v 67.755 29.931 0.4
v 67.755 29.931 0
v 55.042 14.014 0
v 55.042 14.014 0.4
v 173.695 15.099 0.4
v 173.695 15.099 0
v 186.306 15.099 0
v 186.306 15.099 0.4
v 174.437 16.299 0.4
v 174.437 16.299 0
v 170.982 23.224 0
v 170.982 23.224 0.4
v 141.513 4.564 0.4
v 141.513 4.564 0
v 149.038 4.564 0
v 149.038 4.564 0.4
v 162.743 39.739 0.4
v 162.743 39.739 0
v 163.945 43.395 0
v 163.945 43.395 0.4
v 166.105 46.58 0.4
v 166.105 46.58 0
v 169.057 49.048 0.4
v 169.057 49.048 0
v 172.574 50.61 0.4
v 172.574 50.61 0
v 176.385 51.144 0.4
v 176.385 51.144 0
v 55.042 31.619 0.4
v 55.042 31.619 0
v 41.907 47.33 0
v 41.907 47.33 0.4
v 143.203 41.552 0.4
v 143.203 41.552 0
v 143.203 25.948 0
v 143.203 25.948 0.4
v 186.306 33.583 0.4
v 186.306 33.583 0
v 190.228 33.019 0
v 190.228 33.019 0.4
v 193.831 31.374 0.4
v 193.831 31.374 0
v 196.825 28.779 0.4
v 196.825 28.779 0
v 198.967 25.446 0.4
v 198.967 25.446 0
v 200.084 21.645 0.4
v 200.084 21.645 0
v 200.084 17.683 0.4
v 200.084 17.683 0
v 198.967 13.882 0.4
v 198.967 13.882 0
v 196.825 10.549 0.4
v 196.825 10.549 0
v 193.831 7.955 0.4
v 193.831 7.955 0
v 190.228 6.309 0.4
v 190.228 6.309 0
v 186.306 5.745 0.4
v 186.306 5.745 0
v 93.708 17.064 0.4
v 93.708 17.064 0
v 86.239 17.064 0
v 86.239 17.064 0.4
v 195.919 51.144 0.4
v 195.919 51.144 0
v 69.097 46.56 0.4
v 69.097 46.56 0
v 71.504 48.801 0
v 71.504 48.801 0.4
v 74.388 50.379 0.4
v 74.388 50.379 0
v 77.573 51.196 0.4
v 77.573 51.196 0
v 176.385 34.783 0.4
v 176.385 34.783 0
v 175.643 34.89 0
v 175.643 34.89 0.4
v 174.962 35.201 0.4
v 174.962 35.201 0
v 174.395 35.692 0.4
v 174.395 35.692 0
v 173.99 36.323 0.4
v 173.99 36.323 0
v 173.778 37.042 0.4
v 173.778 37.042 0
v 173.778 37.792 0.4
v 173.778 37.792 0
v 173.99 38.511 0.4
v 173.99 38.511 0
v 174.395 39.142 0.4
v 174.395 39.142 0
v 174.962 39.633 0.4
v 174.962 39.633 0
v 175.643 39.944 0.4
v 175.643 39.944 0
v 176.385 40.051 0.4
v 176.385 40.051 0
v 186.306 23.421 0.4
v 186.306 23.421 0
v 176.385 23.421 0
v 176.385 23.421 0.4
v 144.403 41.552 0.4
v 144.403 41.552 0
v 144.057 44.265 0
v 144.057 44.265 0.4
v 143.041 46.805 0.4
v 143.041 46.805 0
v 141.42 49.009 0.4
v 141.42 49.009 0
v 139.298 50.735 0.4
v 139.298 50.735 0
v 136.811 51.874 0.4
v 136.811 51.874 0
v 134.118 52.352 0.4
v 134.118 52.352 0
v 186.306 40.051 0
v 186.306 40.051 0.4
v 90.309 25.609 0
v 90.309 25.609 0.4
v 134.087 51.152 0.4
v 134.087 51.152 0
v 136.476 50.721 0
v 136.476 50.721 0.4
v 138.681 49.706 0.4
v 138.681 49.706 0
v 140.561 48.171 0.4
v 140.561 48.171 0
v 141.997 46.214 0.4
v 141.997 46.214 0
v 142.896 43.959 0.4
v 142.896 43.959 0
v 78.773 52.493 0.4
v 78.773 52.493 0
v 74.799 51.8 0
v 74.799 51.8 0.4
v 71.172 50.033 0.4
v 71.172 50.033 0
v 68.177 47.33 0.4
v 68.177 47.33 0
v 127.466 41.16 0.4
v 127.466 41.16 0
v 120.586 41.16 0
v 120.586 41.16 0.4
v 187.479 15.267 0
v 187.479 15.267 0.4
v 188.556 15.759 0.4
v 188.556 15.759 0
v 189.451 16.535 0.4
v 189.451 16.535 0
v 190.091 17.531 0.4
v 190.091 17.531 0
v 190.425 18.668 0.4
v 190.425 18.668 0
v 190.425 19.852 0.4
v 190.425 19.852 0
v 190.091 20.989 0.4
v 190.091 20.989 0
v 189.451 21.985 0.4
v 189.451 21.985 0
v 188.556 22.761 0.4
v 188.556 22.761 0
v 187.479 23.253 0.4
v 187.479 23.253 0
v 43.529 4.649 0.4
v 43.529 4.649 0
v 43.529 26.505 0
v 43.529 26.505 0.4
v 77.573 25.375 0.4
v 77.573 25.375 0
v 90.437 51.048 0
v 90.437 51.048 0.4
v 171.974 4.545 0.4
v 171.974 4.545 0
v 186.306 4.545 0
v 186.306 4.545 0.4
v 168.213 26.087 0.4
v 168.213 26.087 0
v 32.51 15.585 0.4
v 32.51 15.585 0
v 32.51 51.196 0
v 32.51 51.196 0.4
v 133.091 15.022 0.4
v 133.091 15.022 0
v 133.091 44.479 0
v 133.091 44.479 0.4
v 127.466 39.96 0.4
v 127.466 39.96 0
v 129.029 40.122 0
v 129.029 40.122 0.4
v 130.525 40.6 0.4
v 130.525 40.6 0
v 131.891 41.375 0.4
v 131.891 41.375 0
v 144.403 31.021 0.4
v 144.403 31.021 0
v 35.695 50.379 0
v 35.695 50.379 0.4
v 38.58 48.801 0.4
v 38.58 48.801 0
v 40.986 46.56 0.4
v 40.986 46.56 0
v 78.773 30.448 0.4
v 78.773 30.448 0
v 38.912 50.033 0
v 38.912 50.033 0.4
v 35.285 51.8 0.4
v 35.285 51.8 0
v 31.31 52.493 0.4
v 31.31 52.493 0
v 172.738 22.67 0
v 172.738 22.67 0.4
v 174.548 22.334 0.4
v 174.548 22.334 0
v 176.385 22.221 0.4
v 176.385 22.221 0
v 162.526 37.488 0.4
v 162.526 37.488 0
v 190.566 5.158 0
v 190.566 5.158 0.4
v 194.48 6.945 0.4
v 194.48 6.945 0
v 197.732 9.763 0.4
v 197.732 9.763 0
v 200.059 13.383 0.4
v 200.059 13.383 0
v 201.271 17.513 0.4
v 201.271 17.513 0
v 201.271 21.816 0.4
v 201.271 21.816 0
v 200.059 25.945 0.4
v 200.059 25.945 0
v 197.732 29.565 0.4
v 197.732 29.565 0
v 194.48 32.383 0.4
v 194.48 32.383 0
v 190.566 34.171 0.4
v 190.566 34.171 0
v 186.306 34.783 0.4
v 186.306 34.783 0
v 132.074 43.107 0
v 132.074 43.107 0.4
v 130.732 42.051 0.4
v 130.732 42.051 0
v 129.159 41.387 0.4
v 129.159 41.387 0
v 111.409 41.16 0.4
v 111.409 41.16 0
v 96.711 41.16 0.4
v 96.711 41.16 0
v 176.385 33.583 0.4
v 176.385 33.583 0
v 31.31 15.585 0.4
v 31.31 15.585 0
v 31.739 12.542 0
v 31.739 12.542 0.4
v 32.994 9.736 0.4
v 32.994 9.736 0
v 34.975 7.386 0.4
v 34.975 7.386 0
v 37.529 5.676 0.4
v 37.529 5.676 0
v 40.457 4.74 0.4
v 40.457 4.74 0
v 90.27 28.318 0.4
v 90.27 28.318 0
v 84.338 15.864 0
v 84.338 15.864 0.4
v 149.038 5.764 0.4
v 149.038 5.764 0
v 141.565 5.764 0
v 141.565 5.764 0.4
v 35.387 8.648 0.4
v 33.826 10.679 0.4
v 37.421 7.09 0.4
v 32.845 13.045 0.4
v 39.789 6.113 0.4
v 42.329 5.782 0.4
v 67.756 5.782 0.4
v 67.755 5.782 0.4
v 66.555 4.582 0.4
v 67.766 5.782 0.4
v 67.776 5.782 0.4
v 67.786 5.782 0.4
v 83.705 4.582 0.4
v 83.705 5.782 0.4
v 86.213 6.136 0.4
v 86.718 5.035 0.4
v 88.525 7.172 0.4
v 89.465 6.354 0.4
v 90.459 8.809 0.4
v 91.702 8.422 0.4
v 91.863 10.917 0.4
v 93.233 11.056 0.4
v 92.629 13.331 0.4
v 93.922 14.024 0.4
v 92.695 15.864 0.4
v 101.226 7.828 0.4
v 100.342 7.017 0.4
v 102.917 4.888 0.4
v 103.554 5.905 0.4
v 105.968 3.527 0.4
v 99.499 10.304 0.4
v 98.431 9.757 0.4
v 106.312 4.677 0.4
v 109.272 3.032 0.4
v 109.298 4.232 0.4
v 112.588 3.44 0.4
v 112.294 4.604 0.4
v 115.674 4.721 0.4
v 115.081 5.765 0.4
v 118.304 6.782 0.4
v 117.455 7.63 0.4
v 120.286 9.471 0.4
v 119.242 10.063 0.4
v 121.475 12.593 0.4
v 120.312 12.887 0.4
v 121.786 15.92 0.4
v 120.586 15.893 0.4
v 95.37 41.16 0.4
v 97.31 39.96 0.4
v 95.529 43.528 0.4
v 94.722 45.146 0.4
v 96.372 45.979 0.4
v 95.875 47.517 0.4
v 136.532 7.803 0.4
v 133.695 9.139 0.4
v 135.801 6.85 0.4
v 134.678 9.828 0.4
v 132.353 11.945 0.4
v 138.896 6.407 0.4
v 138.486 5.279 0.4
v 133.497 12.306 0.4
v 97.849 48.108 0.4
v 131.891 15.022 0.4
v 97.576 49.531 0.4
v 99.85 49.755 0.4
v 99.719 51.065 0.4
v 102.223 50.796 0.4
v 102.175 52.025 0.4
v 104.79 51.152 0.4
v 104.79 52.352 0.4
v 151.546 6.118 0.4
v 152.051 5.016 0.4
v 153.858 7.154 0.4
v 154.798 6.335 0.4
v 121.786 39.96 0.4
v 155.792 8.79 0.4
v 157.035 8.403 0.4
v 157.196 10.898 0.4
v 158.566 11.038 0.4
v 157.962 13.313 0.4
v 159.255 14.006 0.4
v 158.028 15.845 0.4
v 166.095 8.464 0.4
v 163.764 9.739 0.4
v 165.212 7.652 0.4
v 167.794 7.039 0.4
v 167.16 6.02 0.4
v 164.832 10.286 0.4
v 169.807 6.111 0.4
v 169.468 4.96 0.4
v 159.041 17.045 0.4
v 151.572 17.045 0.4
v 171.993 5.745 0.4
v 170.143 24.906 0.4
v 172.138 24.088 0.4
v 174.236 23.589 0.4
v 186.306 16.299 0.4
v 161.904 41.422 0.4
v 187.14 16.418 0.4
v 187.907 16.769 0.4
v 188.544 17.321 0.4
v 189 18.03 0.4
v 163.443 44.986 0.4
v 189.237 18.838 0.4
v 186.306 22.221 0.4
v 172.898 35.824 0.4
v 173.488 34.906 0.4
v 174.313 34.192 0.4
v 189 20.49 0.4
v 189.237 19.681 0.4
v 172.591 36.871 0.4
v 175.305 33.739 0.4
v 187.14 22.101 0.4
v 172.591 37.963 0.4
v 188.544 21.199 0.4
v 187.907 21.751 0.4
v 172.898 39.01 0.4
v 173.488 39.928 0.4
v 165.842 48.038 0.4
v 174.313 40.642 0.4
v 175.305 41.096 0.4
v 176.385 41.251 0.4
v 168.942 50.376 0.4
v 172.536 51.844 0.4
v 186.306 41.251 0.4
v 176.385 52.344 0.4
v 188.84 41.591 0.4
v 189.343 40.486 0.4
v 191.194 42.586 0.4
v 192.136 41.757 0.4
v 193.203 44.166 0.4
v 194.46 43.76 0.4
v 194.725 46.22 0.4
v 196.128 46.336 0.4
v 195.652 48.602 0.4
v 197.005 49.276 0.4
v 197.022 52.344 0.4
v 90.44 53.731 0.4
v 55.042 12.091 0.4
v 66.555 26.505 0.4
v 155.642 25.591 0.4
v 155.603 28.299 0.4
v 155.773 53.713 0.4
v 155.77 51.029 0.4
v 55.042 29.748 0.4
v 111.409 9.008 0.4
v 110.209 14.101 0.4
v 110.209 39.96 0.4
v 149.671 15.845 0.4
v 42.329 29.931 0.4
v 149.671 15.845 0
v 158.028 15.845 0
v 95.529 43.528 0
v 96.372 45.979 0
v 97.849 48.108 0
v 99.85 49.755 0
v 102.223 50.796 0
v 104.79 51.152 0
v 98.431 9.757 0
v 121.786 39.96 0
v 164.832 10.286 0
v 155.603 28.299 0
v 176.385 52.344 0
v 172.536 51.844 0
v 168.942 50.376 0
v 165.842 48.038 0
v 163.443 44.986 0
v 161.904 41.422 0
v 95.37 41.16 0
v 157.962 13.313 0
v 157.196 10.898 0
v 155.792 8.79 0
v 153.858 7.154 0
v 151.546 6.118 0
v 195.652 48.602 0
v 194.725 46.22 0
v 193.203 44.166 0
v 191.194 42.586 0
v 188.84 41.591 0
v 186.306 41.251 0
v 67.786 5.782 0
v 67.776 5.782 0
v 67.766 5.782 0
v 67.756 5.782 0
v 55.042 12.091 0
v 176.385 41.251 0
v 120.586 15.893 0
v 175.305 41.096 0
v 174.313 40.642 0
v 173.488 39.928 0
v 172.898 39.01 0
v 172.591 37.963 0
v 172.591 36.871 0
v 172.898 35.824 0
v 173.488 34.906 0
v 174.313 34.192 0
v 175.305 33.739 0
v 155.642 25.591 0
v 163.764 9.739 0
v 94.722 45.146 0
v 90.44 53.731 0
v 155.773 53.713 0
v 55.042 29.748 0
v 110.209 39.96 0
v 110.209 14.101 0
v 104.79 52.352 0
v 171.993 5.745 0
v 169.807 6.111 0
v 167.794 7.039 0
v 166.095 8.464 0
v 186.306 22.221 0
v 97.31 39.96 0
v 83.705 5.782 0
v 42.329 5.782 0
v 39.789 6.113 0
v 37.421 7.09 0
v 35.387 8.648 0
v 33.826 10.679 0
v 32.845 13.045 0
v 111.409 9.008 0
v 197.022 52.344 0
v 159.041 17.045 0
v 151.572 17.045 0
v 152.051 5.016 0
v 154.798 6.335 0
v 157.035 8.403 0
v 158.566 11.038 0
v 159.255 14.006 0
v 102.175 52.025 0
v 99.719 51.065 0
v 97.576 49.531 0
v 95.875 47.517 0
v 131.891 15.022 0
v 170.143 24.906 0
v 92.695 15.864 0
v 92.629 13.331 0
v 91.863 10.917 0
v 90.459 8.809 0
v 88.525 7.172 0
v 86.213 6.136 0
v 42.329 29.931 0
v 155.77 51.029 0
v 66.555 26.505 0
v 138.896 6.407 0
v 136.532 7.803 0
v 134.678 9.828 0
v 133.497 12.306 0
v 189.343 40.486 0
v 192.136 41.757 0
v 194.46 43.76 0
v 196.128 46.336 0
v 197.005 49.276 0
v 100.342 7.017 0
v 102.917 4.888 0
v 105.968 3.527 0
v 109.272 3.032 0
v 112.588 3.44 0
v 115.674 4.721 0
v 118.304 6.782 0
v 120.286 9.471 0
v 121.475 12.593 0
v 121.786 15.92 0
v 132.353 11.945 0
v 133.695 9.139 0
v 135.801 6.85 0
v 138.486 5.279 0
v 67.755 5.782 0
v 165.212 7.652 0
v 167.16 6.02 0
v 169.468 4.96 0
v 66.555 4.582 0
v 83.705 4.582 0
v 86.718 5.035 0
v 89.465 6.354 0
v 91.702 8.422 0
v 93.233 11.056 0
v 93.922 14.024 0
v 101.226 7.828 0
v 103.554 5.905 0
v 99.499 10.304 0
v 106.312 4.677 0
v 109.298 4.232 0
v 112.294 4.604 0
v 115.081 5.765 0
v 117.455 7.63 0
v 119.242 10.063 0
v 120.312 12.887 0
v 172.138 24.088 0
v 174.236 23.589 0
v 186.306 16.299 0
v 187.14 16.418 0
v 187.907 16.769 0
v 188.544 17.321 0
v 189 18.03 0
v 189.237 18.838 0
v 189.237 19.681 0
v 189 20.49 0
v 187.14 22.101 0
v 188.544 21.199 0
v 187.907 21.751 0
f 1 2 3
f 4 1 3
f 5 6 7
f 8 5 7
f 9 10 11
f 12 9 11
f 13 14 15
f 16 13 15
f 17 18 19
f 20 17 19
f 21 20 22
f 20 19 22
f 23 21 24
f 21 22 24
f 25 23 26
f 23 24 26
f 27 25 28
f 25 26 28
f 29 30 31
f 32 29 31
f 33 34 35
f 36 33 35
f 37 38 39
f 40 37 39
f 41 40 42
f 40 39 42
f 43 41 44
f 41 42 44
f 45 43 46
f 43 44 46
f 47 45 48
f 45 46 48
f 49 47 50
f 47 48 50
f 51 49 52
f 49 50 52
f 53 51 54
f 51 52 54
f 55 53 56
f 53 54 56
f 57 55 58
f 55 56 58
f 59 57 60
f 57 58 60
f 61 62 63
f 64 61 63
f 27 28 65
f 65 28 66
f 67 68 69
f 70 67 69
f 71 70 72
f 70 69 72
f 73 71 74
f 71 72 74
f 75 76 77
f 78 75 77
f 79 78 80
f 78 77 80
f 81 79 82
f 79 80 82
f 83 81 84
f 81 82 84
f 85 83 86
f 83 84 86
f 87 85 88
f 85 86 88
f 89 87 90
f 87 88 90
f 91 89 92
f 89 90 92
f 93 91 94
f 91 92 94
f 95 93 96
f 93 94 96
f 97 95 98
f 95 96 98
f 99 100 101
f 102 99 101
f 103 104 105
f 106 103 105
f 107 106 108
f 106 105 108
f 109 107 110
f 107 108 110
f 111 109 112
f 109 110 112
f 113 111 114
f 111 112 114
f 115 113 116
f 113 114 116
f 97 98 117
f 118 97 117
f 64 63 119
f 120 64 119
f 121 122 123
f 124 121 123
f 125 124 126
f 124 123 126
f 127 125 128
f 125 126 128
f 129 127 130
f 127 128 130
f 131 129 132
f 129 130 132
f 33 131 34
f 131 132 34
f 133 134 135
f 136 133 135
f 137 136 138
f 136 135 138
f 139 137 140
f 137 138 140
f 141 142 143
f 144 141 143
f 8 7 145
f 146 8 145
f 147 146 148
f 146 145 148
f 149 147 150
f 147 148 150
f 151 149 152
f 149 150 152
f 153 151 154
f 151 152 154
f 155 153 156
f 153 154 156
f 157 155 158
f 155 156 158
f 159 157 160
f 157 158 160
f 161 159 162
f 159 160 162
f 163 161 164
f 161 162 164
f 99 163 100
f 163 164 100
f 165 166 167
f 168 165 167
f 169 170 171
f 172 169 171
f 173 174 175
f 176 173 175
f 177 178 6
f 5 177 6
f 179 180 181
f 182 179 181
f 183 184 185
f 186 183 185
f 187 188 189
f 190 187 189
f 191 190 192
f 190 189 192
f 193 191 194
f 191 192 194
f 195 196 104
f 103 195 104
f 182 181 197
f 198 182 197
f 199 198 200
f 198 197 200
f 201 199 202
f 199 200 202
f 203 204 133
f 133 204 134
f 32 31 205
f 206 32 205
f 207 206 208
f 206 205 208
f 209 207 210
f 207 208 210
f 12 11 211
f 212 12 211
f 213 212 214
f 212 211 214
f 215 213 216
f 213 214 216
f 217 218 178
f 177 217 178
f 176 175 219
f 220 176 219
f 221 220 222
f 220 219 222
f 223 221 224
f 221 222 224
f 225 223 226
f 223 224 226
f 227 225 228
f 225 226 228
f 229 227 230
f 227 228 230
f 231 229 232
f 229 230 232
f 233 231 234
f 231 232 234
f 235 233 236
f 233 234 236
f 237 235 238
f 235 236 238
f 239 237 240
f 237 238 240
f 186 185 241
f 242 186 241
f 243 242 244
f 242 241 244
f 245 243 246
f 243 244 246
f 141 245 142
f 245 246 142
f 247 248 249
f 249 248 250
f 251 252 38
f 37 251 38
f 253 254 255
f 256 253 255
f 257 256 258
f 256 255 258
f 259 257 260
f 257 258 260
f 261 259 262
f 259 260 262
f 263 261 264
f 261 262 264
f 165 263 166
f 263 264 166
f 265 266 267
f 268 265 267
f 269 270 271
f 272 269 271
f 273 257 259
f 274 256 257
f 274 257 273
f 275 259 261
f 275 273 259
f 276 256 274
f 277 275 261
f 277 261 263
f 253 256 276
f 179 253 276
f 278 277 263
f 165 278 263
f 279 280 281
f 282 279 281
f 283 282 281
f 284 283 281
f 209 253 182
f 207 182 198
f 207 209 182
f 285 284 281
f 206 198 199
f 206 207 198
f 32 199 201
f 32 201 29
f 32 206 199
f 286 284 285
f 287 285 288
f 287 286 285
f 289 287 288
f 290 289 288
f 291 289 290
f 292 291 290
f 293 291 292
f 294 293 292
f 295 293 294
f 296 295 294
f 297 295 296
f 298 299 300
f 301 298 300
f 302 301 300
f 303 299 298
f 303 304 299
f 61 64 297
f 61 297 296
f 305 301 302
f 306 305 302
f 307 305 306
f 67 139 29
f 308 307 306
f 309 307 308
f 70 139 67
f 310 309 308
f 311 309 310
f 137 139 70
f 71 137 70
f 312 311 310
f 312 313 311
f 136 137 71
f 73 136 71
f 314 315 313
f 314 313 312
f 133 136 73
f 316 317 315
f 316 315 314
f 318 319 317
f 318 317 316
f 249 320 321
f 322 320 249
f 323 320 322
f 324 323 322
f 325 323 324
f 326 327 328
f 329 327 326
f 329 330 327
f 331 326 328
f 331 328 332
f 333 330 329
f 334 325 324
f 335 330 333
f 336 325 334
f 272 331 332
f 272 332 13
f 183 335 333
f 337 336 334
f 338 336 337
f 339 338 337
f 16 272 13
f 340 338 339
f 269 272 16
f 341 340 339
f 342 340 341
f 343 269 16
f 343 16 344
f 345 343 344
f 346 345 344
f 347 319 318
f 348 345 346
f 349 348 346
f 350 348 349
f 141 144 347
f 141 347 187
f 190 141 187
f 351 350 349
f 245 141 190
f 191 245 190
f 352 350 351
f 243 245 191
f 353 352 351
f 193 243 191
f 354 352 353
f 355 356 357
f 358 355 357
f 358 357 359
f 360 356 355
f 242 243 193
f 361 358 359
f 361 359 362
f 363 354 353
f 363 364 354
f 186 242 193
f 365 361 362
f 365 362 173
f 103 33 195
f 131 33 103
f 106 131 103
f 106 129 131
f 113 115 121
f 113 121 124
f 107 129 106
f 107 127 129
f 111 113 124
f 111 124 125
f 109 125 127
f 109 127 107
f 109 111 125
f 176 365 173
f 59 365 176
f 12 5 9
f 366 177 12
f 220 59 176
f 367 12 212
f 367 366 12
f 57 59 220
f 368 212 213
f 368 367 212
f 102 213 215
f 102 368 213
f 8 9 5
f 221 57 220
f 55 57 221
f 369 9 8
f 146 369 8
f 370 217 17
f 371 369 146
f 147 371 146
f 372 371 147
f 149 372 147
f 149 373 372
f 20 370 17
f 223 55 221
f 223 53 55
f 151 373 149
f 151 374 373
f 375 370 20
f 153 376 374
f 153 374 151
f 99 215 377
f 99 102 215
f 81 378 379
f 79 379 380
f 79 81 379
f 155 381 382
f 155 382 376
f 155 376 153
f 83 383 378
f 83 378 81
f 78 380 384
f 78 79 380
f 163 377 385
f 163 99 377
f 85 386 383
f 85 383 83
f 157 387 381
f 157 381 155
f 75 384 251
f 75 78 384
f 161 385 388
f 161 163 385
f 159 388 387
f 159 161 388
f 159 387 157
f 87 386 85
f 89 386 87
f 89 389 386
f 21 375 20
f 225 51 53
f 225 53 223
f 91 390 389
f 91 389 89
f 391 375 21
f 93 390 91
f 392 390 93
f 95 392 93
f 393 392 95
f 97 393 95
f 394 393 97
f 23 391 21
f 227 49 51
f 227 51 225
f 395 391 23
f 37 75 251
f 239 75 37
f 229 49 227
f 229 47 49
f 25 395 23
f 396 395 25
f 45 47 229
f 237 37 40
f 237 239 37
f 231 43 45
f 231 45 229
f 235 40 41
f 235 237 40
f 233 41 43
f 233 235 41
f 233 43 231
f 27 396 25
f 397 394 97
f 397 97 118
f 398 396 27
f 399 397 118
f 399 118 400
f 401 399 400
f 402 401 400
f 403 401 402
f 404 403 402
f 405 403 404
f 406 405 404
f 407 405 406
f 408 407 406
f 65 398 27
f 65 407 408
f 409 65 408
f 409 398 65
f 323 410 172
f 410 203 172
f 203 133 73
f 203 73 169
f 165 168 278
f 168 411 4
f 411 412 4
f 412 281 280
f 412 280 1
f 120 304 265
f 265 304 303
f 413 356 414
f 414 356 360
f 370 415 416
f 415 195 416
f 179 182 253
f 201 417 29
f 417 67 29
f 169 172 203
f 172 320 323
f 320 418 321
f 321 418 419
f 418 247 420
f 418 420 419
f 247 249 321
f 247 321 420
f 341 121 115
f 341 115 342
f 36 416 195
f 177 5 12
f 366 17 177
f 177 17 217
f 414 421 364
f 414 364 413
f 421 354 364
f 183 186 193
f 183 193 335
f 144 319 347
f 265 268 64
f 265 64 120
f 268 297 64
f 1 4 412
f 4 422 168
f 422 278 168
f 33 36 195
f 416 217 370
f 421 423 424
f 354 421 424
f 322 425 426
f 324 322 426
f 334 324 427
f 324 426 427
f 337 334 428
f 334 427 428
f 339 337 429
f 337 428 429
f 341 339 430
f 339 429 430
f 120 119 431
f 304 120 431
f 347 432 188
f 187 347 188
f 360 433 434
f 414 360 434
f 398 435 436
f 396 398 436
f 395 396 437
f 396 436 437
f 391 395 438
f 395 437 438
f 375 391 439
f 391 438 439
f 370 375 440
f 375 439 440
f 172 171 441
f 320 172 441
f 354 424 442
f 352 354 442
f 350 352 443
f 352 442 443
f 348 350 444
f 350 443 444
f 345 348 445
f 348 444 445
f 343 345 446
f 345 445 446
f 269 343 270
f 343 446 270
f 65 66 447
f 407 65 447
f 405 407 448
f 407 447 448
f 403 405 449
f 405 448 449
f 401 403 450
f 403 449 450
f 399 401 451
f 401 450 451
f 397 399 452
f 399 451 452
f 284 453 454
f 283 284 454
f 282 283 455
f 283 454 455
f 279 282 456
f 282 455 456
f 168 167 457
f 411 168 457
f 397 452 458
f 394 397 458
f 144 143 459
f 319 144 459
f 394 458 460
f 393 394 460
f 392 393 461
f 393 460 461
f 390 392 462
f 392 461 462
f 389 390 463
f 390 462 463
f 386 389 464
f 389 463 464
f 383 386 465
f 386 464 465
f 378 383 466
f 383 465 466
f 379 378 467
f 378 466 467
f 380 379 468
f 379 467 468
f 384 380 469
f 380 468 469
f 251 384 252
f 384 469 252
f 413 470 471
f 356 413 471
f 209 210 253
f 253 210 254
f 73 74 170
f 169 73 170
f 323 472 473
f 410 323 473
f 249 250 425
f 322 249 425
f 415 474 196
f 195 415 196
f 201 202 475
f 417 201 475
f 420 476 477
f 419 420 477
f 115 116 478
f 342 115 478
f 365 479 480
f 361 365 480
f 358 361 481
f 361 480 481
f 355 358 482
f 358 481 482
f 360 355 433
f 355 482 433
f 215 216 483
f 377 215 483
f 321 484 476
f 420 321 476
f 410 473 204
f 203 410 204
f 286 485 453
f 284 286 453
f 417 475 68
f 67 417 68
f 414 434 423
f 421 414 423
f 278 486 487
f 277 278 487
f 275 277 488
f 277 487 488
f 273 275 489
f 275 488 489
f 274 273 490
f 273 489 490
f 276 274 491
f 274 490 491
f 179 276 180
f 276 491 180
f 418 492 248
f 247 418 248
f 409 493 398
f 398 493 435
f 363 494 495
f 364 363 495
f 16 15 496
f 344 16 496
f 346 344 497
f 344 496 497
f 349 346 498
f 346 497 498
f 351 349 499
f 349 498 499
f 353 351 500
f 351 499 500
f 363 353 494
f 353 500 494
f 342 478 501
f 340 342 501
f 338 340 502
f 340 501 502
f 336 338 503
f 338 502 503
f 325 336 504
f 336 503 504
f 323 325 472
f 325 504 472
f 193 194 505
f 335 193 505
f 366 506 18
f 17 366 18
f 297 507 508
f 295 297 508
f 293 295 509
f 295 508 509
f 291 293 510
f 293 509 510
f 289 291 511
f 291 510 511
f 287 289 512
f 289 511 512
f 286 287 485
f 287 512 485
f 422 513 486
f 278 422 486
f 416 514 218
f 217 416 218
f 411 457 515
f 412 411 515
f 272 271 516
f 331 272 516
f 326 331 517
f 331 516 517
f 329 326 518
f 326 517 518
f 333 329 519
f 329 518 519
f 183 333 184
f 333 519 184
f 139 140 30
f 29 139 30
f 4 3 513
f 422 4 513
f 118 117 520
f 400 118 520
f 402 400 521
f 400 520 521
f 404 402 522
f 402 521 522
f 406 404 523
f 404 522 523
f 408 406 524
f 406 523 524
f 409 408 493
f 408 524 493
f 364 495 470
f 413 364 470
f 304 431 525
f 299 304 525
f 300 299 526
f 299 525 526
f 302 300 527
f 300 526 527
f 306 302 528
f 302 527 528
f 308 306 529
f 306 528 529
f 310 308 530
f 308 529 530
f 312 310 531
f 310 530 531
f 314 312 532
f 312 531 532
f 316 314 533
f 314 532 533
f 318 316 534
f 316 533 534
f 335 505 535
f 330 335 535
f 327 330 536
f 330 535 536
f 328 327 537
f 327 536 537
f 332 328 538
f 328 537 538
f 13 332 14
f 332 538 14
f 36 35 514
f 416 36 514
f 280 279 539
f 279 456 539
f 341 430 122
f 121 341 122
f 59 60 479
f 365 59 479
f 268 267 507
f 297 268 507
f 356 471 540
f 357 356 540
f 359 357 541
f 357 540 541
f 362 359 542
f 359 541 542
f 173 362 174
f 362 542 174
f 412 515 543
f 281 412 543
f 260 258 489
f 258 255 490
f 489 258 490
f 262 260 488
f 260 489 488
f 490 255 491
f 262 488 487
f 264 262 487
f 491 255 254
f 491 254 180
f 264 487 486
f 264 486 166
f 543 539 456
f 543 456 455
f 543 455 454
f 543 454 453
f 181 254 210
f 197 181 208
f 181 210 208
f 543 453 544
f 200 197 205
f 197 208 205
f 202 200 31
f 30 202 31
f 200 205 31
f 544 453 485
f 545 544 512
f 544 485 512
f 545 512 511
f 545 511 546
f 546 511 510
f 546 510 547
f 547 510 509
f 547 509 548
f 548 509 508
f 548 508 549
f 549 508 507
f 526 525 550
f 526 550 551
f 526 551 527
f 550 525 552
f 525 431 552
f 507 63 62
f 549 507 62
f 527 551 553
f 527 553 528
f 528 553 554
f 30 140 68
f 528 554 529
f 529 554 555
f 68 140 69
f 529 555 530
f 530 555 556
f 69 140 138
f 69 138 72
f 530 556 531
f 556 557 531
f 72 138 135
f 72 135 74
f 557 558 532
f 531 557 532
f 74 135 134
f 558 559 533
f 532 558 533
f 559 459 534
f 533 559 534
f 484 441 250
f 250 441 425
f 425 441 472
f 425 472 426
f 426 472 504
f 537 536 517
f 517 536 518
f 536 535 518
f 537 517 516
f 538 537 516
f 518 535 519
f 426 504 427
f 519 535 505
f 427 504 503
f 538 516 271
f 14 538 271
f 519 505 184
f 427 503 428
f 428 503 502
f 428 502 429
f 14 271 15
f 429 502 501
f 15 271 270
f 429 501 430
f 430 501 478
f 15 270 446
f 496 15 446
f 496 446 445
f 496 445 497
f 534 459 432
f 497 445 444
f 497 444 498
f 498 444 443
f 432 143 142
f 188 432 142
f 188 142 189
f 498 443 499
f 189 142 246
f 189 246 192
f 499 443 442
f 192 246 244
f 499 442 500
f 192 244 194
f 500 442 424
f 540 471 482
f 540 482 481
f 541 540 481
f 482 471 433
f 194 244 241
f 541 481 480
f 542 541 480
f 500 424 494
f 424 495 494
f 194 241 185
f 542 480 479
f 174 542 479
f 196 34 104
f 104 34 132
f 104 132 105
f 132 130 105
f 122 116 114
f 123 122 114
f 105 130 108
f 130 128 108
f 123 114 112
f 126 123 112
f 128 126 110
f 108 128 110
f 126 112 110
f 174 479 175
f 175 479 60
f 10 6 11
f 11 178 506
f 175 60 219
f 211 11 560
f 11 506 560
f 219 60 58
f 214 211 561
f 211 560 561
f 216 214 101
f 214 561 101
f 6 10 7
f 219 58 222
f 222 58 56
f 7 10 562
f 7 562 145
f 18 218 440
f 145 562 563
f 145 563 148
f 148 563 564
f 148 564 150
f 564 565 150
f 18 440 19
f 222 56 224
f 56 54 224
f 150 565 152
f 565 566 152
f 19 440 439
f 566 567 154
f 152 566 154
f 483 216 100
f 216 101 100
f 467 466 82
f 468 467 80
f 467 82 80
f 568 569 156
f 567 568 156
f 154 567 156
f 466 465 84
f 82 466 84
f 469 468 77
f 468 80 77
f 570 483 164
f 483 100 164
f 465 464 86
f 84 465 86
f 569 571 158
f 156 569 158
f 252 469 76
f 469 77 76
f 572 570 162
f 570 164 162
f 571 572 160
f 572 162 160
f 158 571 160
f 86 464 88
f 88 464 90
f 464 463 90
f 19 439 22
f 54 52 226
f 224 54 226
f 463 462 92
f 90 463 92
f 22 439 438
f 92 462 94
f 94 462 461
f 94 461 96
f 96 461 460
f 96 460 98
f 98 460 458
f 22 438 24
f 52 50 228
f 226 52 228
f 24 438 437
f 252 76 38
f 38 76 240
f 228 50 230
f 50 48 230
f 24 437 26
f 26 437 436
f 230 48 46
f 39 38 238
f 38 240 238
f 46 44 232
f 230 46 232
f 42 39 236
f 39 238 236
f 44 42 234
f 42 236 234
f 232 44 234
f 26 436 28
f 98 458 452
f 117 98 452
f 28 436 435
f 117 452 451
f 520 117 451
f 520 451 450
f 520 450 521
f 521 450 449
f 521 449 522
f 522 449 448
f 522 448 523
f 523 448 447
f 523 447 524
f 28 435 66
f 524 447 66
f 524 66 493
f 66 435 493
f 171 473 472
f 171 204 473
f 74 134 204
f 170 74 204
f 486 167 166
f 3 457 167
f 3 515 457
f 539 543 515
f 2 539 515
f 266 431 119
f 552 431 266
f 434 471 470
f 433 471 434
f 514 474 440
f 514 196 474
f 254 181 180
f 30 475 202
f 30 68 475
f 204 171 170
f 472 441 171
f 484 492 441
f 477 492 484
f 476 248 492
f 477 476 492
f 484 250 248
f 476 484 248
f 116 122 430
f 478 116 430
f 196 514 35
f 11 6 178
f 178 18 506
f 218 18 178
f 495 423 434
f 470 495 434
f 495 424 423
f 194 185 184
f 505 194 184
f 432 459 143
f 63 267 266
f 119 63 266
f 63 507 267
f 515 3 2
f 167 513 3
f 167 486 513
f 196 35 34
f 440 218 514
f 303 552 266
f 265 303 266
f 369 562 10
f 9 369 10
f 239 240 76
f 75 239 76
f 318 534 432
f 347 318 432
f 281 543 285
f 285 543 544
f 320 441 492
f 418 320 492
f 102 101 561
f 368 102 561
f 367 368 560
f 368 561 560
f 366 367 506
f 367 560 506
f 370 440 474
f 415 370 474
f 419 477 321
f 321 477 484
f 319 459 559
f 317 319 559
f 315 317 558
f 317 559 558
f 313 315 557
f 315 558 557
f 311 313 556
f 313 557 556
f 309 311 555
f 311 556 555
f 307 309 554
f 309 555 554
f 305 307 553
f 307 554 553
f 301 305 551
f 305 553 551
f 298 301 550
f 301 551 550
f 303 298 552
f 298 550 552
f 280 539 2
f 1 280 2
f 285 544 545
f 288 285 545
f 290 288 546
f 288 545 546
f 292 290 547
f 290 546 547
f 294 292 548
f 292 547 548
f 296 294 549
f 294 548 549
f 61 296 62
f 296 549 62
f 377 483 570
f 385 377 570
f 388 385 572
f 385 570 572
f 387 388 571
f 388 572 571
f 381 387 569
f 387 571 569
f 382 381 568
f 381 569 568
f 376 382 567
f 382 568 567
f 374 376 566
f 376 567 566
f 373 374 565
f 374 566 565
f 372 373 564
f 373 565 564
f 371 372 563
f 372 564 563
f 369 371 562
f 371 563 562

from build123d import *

# Parameters (mm, degrees)
F1_DEPTH = 0.4


with BuildPart() as f1:
    # F0 (on Top) → F1 (new body)
    with BuildSketch(Plane.XY):
        with BuildLine():
            Line((134.117601, 52.35192), (104.790399, 52.35192))
            ThreePointArc((104.790399, 52.35192), (98.599906, 50.364955), (94.722175, 45.146388))
            Line((94.722175, 45.146388), (90.439587, 53.731151))
            Line((90.439587, 53.731151), (78.773495, 30.448411))
            Line((78.773495, 30.448411), (78.773495, 52.493423))
            ThreePointArc((78.773495, 52.493423), (72.923348, 51.04402), (68.176621, 47.33005))
            Line((68.176621, 47.33005), (55.041848, 31.619177))
            Line((55.041848, 31.619177), (41.907075, 47.33005))
            ThreePointArc((41.907075, 47.33005), (37.160347, 51.04402), (31.3102, 52.493423))
            Line((31.3102, 52.493423), (31.3102, 15.584978))
            ThreePointArc((31.3102, 15.584978), (34.975357, 7.386031), (43.52908, 4.649262))
            Line((43.52908, 4.649262), (43.52908, 26.505338))
            Line((43.52908, 26.505338), (55.041848, 12.091459))
            Line((55.041848, 12.091459), (66.554615, 26.505338))
            Line((66.554615, 26.505338), (66.554615, 4.581898))
            Line((66.554615, 4.581898), (83.704581, 4.581914))
            ThreePointArc((83.704581, 4.581914), (91.70244, 8.42165), (93.707784, 17.063867))
            Line((93.707784, 17.063867), (86.238848, 17.063867))
            Line((86.238848, 17.063867), (90.309106, 25.609449))
            Line((90.309106, 25.609449), (98.430799, 9.756892))
            ThreePointArc((98.430799, 9.756892), (112.588106, 3.440158), (121.785738, 15.919502))
            Line((121.785738, 15.919502), (121.785738, 39.959846))
            Line((121.785738, 39.959846), (127.466301, 39.959846))
            ThreePointArc((127.466301, 39.959846), (129.789281, 40.322243), (131.891491, 41.374992))
            Line((131.891491, 41.374992), (131.891491, 15.021686))
            ThreePointArc((131.891491, 15.021686), (134.662869, 7.916194), (141.513281, 4.563521))
            Line((141.513281, 4.563521), (149.037555, 4.563528))
            ThreePointArc((149.037555, 4.563528), (157.035414, 8.403264), (159.040758, 17.045482))
            Line((159.040758, 17.045482), (151.571822, 17.045482))
            Line((151.571822, 17.045482), (155.64208, 25.591063))
            Line((155.64208, 25.591063), (163.763773, 9.738506))
            ThreePointArc((163.763773, 9.738506), (167.159763, 6.0203), (171.974498, 4.545128))
            Line((171.974498, 4.545128), (178.360625, 4.545128))
            Line((178.360625, 4.545128), (186.306138, 4.545128))
            ThreePointArc((186.306138, 4.545128), (201.425191, 19.664181), (186.306138, 34.783235))
            Line((186.306138, 34.783235), (176.385451, 34.783235))
            ThreePointArc((176.385451, 34.783235), (173.751636, 37.41705), (176.385451, 40.050866))
            Line((176.385451, 40.050866), (186.306138, 40.050866))
            ThreePointArc((186.306138, 40.050866), (194.459994, 43.760102), (197.021679, 52.3439))
            Line((197.021679, 52.3439), (176.385451, 52.3439))
            ThreePointArc((176.385451, 52.3439), (167.316213, 49.307242), (161.90404, 41.421765))
            Line((161.90404, 41.421765), (155.772561, 53.712765))
            Line((155.772561, 53.712765), (144.402741, 31.021313))
            Line((144.402741, 31.021313), (144.402741, 41.55154))
            ThreePointArc((144.402741, 41.55154), (141.420105, 49.008622), (134.117601, 52.35192))
        make_face()
        Polygon((110.209341, 39.95985), (110.209341, 14.101218), (97.309523, 39.95985), align=None, mode=Mode.SUBTRACT)
        with BuildLine():
            Line((32.510204, 15.584978), (32.510204, 51.195543))
            ThreePointArc((32.510204, 51.195543), (37.18689, 49.67996), (40.986429, 46.560362))
            Line((40.986429, 46.560362), (55.041848, 29.748278))
            Line((55.041848, 29.748278), (69.097267, 46.560362))
            ThreePointArc((69.097267, 46.560362), (72.896805, 49.67996), (77.573491, 51.195543))
            Line((77.573491, 51.195543), (77.573491, 25.374748))
            Line((77.573491, 25.374748), (90.437222, 51.04769))
            Line((90.437222, 51.04769), (95.369863, 41.15985))
            Line((95.369863, 41.15985), (111.409341, 9.007538))
            Line((111.409341, 9.007538), (111.409341, 41.15985))
            Line((111.409341, 41.15985), (96.710893, 41.15985))
            Line((96.710893, 41.15985), (95.529365, 43.528313))
            ThreePointArc((95.529365, 43.528313), (98.792773, 49.000858), (104.790399, 51.151916))
            Line((104.790399, 51.151916), (134.087416, 51.151916))
            ThreePointArc((134.087416, 51.151916), (140.560905, 48.17076), (143.202737, 41.55154))
            Line((143.202737, 41.55154), (143.202737, 25.947649))
            Line((143.202737, 25.947649), (155.770196, 51.029305))
            Line((155.770196, 51.029305), (162.525616, 37.48757))
            Line((162.525616, 37.48757), (168.213113, 26.086565))
            Line((168.213113, 26.086565), (173.694601, 15.098518))
            Line((173.694601, 15.098518), (186.306138, 15.098518))
            ThreePointArc((186.306138, 15.098518), (190.467475, 19.259855), (186.306138, 23.421193))
            Line((186.306138, 23.421193), (176.385451, 23.421193))
            ThreePointArc((176.385451, 23.421193), (173.177011, 23.797627), (170.142836, 24.906486))
            Line((170.142836, 24.906486), (162.743499, 39.739006))
            ThreePointArc((162.743499, 39.739006), (167.494805, 47.917086), (176.385451, 51.143896))
            Line((176.385451, 51.143896), (195.918921, 51.143896))
            ThreePointArc((195.918921, 51.143896), (193.203195, 44.16594), (186.306138, 41.25087))
            Line((186.306138, 41.25087), (176.385451, 41.25087))
            ThreePointArc((176.385451, 41.25087), (172.551632, 37.41705), (176.385451, 33.583231))
            Line((176.385451, 33.583231), (186.306138, 33.583231))
            ThreePointArc((186.306138, 33.583231), (200.225188, 19.664181), (186.306138, 5.745132))
            Line((186.306138, 5.745132), (178.360625, 5.745132))
            Line((178.360625, 5.745132), (171.993494, 5.745132))
            ThreePointArc((171.993494, 5.745132), (167.793729, 7.039214), (164.831771, 10.28567))
            Line((164.831771, 10.28567), (155.602871, 28.29936))
            Line((155.602871, 28.29936), (149.671091, 15.845478))
            Line((149.671091, 15.845478), (158.027767, 15.845478))
            ThreePointArc((158.027767, 15.845478), (155.791616, 8.790163), (149.037554, 5.763532))
            Line((149.037554, 5.763532), (141.564783, 5.763525))
            ThreePointArc((141.564783, 5.763525), (135.529592, 8.746533), (133.091494, 15.021686))
            Line((133.091494, 15.021686), (133.091494, 44.478871))
            ThreePointArc((133.091494, 44.478871), (130.731983, 42.051456), (127.466301, 41.15985))
            Line((127.466301, 41.15985), (120.585735, 41.15985))
            Line((120.585735, 41.15985), (120.585735, 15.893338))
            ThreePointArc((120.585735, 15.893338), (112.293961, 4.603626), (99.498797, 10.304056))
            Line((99.498797, 10.304056), (90.269897, 28.317746))
            Line((90.269897, 28.317746), (84.338117, 15.863864))
            Line((84.338117, 15.863864), (92.694793, 15.863864))
            ThreePointArc((92.694793, 15.863864), (90.458642, 8.808548), (83.70458, 5.781918))
            Line((83.70458, 5.781918), (67.786207, 5.781903))
            ThreePointArc((67.786207, 5.781903), (67.771236, 5.78189), (67.756265, 5.7819))
            ThreePointArc((67.756265, 5.7819), (67.755442, 5.781902), (67.754619, 5.781903))
            Line((67.754619, 5.781903), (67.754619, 29.930541))
            Line((67.754619, 29.930541), (55.041848, 14.014268))
            Line((55.041848, 14.014268), (42.329077, 29.930541))
            Line((42.329077, 29.930541), (42.329077, 5.781903))
            ThreePointArc((42.329077, 5.781903), (35.387045, 8.647569), (32.510204, 15.584978))
        make_face(mode=Mode.SUBTRACT)
        with BuildLine():
            Line((174.437, 16.298518), (170.982292, 23.223732))
            ThreePointArc((170.982292, 23.223732), (173.637761, 22.473948), (176.385451, 22.221193))
            Line((176.385451, 22.221193), (186.306138, 22.221193))
            ThreePointArc((186.306138, 22.221193), (189.267475, 19.259855), (186.306138, 16.298518))
            Line((186.306138, 16.298518), (174.437, 16.298518))
        make_face(mode=Mode.SUBTRACT)
    extrude(amount=F1_DEPTH)


solid = f1.part
